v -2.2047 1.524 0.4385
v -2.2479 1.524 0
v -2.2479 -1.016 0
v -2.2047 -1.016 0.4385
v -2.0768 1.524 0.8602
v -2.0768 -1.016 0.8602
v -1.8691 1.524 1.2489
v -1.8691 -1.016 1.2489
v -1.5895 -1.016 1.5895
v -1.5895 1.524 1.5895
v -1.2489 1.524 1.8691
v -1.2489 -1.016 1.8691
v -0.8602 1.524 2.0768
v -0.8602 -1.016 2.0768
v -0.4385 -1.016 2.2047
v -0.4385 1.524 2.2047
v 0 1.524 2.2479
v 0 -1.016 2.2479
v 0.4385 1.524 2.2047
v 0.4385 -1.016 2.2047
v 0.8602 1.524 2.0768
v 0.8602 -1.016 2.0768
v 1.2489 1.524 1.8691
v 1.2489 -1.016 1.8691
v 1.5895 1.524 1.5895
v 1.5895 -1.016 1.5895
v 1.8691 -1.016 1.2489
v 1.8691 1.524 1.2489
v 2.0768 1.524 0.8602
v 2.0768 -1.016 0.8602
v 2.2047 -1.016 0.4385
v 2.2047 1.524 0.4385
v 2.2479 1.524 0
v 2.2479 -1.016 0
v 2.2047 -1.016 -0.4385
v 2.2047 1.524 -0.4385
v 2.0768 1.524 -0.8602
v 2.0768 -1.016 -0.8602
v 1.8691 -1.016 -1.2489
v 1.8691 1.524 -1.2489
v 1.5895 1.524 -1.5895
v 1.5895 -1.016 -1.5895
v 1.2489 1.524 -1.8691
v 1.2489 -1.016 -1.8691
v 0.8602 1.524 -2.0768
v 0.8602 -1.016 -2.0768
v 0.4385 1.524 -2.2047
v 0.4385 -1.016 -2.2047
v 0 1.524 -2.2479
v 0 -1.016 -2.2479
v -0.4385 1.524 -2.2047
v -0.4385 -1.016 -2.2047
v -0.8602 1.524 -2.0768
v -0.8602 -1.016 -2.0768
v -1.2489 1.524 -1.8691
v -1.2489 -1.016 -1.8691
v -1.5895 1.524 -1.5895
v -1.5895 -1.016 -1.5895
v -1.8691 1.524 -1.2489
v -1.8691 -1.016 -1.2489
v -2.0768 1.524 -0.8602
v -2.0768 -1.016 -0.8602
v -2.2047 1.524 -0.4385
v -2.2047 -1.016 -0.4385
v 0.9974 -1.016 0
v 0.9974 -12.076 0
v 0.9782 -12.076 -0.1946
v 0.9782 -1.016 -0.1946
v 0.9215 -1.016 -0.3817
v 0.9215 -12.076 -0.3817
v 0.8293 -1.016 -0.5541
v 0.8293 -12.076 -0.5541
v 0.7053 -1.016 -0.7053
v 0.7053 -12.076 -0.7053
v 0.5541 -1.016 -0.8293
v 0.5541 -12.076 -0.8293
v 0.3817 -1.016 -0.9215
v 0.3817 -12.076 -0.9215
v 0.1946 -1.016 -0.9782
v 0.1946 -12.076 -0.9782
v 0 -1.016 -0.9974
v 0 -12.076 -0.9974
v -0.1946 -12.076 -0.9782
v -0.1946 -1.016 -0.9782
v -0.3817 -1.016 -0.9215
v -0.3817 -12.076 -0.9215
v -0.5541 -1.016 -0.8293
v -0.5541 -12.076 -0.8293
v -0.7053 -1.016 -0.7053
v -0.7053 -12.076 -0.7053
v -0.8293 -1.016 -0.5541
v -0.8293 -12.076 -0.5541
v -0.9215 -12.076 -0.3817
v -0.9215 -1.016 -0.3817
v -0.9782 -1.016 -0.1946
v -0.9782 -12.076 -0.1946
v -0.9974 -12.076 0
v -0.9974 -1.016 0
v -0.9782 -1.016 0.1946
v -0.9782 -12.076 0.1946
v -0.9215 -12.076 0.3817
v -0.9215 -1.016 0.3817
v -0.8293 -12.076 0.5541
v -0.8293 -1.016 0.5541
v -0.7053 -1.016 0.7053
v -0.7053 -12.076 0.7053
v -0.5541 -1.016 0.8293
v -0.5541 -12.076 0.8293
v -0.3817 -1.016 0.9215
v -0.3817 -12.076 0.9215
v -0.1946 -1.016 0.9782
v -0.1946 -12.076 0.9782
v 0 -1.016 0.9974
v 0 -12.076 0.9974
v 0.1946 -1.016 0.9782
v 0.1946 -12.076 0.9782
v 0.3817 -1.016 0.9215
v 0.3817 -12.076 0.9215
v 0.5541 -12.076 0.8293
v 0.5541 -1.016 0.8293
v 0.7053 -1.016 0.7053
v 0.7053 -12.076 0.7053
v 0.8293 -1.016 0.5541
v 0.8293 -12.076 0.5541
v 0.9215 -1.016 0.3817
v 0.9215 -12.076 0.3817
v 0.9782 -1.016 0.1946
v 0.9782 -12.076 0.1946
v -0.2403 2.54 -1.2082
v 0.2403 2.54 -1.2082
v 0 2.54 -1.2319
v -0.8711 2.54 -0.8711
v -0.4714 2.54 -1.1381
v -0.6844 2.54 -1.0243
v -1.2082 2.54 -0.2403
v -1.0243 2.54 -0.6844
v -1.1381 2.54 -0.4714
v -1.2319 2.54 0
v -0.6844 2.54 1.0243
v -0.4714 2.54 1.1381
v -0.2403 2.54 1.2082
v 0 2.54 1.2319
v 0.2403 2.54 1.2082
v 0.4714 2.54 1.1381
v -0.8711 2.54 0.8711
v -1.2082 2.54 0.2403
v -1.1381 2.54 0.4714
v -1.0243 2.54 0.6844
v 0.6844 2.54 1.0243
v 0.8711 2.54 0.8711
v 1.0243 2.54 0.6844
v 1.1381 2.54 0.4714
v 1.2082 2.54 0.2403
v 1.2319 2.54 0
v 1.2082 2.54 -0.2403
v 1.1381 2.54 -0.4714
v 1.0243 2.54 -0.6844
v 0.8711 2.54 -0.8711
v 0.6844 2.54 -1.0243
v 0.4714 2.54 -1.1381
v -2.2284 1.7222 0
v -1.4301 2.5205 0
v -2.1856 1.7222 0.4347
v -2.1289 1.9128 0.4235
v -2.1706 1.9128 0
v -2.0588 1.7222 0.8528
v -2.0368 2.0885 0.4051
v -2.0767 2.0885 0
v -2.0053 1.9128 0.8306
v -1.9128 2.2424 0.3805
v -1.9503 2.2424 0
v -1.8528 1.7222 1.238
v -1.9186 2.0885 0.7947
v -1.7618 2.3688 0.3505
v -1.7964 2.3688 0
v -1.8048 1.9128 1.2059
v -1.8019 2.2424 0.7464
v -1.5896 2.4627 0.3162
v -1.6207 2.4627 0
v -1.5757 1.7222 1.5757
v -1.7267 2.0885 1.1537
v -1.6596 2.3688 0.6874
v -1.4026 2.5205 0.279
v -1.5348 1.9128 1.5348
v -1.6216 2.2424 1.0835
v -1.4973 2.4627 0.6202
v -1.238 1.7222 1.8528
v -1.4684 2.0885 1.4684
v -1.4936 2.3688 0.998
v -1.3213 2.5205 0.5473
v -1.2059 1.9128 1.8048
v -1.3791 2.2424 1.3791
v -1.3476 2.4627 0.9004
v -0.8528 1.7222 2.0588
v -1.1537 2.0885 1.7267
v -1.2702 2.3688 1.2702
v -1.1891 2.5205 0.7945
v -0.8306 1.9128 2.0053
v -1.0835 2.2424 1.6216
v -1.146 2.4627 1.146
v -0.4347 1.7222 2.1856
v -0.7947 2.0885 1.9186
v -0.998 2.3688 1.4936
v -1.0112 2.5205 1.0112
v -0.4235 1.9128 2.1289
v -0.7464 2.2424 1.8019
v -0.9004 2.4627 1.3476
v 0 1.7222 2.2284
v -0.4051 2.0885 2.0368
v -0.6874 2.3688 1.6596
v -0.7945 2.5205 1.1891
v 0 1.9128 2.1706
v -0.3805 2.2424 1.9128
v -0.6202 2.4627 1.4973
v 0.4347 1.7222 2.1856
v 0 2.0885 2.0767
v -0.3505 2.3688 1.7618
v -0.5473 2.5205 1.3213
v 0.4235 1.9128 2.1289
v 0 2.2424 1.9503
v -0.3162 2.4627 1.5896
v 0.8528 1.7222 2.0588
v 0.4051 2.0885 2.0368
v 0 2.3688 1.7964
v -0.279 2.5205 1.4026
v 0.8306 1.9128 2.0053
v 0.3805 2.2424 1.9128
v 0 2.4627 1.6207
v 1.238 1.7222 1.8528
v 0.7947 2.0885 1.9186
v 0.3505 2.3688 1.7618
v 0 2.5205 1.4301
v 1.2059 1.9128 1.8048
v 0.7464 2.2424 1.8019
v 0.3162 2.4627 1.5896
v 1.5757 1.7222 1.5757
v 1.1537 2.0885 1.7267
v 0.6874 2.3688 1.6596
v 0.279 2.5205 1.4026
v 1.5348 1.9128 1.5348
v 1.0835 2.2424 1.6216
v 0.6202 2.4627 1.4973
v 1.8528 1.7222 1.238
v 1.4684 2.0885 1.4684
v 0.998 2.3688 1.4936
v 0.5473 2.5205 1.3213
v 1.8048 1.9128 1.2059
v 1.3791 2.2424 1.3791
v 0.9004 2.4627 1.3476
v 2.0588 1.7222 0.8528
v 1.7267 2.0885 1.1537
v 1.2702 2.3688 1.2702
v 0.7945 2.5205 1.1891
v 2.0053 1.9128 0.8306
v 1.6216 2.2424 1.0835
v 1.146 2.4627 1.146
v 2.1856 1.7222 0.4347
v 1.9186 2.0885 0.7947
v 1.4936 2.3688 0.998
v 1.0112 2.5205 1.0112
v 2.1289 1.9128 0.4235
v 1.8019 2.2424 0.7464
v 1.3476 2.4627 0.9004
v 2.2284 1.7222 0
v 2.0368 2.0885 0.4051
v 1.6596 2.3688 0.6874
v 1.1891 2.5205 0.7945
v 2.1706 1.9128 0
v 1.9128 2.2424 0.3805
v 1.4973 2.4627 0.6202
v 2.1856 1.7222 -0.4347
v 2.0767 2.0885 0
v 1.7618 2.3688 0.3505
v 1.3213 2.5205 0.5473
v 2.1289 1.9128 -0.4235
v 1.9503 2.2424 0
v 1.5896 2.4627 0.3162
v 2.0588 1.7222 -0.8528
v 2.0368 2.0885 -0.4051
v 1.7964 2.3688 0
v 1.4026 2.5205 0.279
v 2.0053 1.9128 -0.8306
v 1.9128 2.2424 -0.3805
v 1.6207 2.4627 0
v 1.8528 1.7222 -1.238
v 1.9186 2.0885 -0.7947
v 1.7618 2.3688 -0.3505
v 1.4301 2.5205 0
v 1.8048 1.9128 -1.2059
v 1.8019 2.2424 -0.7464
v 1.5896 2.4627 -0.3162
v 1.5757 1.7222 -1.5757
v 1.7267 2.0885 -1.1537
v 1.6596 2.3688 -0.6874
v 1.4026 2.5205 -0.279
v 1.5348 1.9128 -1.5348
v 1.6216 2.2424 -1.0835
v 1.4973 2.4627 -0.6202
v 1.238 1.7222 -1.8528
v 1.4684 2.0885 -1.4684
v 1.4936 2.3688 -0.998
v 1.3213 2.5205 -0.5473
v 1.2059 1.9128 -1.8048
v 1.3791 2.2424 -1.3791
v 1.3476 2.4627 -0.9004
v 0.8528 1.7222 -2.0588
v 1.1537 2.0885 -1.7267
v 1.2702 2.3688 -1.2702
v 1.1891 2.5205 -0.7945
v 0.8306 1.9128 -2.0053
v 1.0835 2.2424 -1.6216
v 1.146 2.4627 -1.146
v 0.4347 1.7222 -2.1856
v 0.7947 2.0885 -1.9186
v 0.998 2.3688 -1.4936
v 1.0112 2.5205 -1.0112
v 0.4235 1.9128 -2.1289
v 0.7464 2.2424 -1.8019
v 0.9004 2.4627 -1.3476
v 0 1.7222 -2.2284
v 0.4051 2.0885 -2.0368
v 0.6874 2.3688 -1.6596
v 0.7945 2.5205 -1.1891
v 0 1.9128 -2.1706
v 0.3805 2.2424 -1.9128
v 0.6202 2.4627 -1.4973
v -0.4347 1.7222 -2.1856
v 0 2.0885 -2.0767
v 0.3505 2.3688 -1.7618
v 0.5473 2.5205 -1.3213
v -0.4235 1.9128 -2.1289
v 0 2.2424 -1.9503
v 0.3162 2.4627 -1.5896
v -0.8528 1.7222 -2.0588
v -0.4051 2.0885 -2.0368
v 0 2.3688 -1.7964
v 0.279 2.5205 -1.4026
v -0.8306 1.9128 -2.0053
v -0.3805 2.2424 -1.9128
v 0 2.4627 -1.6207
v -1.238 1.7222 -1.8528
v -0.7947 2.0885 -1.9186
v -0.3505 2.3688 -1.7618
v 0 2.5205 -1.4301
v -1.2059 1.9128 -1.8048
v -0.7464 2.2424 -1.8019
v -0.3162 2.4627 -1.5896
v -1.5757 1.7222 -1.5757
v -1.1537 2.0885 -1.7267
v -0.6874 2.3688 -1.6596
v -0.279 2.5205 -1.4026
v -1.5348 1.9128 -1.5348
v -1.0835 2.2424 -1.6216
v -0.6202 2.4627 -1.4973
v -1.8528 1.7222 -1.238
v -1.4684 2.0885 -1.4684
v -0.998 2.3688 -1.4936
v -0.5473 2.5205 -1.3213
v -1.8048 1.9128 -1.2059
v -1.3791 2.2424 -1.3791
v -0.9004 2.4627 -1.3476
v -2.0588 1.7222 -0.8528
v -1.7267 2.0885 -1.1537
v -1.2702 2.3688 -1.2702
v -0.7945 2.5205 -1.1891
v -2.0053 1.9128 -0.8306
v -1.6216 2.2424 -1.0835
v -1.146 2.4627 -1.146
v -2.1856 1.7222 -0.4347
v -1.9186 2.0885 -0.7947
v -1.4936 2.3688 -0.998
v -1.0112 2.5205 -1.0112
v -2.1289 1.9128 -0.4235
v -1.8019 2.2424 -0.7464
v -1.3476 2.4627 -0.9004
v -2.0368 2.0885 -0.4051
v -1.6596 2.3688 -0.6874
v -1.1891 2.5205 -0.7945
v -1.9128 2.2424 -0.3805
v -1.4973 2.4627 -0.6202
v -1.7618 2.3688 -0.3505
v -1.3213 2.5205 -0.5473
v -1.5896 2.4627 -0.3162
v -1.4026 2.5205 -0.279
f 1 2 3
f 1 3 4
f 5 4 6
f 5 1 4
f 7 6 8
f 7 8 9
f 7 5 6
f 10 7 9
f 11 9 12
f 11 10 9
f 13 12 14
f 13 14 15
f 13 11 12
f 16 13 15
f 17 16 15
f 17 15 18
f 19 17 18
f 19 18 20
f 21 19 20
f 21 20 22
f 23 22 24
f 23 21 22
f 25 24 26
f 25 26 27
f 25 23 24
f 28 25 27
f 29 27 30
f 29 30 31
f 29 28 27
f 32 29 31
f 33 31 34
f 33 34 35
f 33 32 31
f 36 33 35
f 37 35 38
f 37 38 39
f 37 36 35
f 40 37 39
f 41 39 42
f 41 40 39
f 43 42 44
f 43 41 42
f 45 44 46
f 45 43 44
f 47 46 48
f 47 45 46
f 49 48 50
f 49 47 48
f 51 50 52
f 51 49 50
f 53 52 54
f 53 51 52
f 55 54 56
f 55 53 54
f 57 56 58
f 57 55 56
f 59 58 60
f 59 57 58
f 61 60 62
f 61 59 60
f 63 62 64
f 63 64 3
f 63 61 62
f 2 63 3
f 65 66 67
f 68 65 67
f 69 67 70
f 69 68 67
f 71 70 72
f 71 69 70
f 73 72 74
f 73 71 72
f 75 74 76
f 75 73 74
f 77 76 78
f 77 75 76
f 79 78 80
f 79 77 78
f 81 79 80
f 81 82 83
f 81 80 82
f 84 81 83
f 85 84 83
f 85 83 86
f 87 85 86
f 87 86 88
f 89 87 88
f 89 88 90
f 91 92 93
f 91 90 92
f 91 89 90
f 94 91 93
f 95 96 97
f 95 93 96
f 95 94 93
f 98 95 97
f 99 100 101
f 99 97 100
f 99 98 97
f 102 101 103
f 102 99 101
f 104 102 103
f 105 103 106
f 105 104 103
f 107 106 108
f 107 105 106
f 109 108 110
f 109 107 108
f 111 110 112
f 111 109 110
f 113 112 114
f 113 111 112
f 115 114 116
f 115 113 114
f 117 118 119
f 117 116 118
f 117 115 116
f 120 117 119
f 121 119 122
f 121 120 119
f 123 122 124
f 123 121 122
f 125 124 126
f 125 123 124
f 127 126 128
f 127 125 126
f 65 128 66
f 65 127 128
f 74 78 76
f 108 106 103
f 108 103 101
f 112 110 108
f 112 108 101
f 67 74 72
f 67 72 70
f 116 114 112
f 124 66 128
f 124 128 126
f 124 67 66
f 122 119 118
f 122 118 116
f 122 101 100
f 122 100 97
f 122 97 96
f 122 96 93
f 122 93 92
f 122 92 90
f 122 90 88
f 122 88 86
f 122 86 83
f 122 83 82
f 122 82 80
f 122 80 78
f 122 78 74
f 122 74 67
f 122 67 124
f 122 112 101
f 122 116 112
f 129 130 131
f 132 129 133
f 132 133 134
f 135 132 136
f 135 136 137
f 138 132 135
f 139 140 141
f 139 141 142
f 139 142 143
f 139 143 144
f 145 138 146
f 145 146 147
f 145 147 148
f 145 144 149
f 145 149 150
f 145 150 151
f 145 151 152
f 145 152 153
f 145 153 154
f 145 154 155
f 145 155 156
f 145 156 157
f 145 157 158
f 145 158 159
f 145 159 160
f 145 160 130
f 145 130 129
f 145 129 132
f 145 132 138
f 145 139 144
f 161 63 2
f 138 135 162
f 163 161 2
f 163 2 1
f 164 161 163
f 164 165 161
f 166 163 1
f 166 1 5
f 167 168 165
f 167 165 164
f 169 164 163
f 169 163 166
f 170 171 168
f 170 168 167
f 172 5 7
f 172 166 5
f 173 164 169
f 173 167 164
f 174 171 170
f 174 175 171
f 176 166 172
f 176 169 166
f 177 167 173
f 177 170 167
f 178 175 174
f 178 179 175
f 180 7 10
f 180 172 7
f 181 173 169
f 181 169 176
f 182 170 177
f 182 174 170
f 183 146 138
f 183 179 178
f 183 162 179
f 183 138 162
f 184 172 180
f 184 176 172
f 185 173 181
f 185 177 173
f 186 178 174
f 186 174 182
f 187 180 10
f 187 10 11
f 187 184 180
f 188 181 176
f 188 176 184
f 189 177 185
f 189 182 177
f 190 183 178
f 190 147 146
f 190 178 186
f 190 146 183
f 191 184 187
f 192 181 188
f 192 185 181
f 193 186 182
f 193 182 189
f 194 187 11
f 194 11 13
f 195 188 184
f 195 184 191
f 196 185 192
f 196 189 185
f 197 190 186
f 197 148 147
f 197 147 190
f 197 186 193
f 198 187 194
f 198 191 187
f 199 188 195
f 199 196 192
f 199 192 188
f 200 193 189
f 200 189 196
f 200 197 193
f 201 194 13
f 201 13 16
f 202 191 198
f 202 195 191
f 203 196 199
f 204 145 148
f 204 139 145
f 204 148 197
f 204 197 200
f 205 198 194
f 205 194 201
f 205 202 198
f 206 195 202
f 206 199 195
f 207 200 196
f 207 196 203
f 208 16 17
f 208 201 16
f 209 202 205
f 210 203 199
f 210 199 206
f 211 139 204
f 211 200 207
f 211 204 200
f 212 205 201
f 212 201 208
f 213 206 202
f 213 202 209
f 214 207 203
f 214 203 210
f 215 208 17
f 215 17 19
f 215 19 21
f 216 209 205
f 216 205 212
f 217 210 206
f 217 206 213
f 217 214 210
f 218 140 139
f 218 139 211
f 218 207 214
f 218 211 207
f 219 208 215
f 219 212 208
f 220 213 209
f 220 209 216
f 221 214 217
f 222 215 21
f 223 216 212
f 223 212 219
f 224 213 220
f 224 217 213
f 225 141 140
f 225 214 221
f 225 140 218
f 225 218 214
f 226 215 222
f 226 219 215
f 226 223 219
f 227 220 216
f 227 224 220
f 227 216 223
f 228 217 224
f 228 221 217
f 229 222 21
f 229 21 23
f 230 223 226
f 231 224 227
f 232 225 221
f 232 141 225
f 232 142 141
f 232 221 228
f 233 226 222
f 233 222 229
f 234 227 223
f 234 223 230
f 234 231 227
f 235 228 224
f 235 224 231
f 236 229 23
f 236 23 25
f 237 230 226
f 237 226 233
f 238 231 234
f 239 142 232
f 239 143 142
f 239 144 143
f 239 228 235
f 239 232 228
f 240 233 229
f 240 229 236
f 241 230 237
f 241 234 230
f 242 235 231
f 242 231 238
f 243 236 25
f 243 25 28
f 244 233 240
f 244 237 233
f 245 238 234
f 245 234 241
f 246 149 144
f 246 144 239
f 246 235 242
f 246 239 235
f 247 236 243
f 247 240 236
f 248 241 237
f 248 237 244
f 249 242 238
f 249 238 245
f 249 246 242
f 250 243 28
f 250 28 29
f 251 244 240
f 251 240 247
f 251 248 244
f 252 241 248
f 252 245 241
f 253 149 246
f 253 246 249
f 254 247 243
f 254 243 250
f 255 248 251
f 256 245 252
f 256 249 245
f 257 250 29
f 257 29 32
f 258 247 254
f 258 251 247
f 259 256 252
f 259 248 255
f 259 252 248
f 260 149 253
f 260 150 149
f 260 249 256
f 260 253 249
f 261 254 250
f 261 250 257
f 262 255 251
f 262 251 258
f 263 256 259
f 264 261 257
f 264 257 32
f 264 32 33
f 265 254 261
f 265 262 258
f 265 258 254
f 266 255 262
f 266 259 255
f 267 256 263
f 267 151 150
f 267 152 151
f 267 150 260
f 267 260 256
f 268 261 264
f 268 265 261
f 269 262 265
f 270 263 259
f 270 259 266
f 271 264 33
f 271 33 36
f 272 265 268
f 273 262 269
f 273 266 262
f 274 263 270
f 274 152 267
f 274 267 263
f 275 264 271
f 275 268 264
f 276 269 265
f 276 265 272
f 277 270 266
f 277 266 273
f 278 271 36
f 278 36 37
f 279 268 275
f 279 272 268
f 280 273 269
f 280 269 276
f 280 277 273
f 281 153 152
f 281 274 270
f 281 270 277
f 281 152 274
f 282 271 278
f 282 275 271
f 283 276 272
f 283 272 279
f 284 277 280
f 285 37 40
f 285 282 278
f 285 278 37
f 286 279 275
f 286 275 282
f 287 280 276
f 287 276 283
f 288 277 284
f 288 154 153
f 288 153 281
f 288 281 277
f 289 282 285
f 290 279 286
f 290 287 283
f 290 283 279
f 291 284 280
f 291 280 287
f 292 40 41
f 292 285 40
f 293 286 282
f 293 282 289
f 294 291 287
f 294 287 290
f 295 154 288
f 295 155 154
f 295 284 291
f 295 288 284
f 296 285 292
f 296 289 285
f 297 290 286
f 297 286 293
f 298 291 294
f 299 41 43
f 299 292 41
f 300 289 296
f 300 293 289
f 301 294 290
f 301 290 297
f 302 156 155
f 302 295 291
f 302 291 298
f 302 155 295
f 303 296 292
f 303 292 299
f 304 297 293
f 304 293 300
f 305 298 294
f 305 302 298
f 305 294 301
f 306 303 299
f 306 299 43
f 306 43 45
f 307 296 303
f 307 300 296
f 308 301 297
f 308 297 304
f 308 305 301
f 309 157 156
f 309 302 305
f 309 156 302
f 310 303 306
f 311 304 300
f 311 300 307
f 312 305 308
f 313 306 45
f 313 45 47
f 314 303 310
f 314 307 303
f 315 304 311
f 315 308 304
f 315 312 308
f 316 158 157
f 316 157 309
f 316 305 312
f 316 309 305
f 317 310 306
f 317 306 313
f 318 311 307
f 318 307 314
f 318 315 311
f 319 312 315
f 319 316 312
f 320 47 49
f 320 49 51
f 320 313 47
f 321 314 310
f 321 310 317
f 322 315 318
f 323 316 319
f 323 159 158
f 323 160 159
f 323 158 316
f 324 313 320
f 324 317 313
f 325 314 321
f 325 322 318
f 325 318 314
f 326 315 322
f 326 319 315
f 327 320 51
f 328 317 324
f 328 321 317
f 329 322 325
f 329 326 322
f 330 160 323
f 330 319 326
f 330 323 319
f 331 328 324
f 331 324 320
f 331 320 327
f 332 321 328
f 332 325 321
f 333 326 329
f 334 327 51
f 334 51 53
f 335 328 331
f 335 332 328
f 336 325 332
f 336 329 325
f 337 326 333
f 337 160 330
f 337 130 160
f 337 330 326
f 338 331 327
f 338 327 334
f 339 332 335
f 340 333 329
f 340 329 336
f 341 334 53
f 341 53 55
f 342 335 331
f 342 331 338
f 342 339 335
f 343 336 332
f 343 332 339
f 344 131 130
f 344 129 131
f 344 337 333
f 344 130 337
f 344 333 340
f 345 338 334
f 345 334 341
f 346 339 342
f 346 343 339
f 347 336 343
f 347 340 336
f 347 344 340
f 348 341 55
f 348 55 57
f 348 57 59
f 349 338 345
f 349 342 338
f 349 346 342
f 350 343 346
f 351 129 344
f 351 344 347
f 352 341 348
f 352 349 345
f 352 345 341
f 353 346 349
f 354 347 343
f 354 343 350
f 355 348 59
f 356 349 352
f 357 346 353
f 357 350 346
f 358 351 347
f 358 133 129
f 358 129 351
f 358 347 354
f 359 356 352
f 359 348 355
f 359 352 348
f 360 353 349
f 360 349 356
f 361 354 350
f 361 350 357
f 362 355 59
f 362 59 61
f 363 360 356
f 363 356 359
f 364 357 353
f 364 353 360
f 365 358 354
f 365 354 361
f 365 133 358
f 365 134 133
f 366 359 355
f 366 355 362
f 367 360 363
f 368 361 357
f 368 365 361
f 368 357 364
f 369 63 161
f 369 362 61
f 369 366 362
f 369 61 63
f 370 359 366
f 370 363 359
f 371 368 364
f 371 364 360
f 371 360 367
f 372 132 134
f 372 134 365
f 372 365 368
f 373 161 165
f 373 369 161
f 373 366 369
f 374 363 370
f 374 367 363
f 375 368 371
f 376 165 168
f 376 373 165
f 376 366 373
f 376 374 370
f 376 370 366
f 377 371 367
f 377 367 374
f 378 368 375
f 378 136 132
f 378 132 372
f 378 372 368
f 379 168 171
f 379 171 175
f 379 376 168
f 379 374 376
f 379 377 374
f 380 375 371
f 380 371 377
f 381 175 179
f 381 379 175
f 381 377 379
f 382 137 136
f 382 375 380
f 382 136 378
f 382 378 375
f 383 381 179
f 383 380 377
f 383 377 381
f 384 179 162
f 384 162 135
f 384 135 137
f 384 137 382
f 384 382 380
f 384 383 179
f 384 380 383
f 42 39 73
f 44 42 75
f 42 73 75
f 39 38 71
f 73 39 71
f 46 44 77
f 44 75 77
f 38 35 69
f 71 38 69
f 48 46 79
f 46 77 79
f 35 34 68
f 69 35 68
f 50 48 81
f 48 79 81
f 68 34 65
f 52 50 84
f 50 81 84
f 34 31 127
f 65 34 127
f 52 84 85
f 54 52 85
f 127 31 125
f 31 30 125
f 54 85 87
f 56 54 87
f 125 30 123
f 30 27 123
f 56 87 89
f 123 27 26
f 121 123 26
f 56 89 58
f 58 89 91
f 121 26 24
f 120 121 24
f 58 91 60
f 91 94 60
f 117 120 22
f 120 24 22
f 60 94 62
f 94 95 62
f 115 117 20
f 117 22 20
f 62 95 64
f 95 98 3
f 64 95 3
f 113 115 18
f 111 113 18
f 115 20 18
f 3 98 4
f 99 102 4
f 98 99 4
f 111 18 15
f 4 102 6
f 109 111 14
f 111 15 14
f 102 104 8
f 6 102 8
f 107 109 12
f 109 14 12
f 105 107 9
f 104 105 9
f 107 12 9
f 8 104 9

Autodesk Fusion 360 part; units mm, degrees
sketch "Sketch2" plane through (0, 0, 0) normal (0, -1, 0) x (1, 0, 0)
  circle A0 centre (0, 0) radius 0.9974
  circle A1 centre (0, 0) radius 2.2479
extrude "Extrude1" add sketch "Sketch2" along normal blind 7.25 contours A0
extrude "Extrude2" add 1 faces at (-0.2437, -7.25, 0.2261) along direction (0, -1, 0) blind 7.366
extrude "Extrude4" cut 1 faces at (-0.2437, -14.616, 0.2261) along direction (0, 1, 0) blind 2.54
sketch "Sketch3" plane through (0, 0, 0) normal (0, 1, 0) x (-1, 0, 0)
  circle A0 centre (0, 0) radius 0.9974
  circle A1 centre (0, 0) radius 2.2479
  dimension "d14" = 4.4958
extrude "Extrude5" add sketch "Sketch3" along normal blind 3.81 contours A0 | A1
extrude "Extrude6" add 1 faces at (-1.819, 0, -0.1612) along direction (0, -1, 0) blind 1.016
extrude "Extrude7" cut 1 faces at (-0.7569, 3.81, -0.3251) along direction (0, -1, 0) blind 1.27
fillet "Fillet1" radius 1.016 1 edges at (2.0958, 2.54, 0.8129)
